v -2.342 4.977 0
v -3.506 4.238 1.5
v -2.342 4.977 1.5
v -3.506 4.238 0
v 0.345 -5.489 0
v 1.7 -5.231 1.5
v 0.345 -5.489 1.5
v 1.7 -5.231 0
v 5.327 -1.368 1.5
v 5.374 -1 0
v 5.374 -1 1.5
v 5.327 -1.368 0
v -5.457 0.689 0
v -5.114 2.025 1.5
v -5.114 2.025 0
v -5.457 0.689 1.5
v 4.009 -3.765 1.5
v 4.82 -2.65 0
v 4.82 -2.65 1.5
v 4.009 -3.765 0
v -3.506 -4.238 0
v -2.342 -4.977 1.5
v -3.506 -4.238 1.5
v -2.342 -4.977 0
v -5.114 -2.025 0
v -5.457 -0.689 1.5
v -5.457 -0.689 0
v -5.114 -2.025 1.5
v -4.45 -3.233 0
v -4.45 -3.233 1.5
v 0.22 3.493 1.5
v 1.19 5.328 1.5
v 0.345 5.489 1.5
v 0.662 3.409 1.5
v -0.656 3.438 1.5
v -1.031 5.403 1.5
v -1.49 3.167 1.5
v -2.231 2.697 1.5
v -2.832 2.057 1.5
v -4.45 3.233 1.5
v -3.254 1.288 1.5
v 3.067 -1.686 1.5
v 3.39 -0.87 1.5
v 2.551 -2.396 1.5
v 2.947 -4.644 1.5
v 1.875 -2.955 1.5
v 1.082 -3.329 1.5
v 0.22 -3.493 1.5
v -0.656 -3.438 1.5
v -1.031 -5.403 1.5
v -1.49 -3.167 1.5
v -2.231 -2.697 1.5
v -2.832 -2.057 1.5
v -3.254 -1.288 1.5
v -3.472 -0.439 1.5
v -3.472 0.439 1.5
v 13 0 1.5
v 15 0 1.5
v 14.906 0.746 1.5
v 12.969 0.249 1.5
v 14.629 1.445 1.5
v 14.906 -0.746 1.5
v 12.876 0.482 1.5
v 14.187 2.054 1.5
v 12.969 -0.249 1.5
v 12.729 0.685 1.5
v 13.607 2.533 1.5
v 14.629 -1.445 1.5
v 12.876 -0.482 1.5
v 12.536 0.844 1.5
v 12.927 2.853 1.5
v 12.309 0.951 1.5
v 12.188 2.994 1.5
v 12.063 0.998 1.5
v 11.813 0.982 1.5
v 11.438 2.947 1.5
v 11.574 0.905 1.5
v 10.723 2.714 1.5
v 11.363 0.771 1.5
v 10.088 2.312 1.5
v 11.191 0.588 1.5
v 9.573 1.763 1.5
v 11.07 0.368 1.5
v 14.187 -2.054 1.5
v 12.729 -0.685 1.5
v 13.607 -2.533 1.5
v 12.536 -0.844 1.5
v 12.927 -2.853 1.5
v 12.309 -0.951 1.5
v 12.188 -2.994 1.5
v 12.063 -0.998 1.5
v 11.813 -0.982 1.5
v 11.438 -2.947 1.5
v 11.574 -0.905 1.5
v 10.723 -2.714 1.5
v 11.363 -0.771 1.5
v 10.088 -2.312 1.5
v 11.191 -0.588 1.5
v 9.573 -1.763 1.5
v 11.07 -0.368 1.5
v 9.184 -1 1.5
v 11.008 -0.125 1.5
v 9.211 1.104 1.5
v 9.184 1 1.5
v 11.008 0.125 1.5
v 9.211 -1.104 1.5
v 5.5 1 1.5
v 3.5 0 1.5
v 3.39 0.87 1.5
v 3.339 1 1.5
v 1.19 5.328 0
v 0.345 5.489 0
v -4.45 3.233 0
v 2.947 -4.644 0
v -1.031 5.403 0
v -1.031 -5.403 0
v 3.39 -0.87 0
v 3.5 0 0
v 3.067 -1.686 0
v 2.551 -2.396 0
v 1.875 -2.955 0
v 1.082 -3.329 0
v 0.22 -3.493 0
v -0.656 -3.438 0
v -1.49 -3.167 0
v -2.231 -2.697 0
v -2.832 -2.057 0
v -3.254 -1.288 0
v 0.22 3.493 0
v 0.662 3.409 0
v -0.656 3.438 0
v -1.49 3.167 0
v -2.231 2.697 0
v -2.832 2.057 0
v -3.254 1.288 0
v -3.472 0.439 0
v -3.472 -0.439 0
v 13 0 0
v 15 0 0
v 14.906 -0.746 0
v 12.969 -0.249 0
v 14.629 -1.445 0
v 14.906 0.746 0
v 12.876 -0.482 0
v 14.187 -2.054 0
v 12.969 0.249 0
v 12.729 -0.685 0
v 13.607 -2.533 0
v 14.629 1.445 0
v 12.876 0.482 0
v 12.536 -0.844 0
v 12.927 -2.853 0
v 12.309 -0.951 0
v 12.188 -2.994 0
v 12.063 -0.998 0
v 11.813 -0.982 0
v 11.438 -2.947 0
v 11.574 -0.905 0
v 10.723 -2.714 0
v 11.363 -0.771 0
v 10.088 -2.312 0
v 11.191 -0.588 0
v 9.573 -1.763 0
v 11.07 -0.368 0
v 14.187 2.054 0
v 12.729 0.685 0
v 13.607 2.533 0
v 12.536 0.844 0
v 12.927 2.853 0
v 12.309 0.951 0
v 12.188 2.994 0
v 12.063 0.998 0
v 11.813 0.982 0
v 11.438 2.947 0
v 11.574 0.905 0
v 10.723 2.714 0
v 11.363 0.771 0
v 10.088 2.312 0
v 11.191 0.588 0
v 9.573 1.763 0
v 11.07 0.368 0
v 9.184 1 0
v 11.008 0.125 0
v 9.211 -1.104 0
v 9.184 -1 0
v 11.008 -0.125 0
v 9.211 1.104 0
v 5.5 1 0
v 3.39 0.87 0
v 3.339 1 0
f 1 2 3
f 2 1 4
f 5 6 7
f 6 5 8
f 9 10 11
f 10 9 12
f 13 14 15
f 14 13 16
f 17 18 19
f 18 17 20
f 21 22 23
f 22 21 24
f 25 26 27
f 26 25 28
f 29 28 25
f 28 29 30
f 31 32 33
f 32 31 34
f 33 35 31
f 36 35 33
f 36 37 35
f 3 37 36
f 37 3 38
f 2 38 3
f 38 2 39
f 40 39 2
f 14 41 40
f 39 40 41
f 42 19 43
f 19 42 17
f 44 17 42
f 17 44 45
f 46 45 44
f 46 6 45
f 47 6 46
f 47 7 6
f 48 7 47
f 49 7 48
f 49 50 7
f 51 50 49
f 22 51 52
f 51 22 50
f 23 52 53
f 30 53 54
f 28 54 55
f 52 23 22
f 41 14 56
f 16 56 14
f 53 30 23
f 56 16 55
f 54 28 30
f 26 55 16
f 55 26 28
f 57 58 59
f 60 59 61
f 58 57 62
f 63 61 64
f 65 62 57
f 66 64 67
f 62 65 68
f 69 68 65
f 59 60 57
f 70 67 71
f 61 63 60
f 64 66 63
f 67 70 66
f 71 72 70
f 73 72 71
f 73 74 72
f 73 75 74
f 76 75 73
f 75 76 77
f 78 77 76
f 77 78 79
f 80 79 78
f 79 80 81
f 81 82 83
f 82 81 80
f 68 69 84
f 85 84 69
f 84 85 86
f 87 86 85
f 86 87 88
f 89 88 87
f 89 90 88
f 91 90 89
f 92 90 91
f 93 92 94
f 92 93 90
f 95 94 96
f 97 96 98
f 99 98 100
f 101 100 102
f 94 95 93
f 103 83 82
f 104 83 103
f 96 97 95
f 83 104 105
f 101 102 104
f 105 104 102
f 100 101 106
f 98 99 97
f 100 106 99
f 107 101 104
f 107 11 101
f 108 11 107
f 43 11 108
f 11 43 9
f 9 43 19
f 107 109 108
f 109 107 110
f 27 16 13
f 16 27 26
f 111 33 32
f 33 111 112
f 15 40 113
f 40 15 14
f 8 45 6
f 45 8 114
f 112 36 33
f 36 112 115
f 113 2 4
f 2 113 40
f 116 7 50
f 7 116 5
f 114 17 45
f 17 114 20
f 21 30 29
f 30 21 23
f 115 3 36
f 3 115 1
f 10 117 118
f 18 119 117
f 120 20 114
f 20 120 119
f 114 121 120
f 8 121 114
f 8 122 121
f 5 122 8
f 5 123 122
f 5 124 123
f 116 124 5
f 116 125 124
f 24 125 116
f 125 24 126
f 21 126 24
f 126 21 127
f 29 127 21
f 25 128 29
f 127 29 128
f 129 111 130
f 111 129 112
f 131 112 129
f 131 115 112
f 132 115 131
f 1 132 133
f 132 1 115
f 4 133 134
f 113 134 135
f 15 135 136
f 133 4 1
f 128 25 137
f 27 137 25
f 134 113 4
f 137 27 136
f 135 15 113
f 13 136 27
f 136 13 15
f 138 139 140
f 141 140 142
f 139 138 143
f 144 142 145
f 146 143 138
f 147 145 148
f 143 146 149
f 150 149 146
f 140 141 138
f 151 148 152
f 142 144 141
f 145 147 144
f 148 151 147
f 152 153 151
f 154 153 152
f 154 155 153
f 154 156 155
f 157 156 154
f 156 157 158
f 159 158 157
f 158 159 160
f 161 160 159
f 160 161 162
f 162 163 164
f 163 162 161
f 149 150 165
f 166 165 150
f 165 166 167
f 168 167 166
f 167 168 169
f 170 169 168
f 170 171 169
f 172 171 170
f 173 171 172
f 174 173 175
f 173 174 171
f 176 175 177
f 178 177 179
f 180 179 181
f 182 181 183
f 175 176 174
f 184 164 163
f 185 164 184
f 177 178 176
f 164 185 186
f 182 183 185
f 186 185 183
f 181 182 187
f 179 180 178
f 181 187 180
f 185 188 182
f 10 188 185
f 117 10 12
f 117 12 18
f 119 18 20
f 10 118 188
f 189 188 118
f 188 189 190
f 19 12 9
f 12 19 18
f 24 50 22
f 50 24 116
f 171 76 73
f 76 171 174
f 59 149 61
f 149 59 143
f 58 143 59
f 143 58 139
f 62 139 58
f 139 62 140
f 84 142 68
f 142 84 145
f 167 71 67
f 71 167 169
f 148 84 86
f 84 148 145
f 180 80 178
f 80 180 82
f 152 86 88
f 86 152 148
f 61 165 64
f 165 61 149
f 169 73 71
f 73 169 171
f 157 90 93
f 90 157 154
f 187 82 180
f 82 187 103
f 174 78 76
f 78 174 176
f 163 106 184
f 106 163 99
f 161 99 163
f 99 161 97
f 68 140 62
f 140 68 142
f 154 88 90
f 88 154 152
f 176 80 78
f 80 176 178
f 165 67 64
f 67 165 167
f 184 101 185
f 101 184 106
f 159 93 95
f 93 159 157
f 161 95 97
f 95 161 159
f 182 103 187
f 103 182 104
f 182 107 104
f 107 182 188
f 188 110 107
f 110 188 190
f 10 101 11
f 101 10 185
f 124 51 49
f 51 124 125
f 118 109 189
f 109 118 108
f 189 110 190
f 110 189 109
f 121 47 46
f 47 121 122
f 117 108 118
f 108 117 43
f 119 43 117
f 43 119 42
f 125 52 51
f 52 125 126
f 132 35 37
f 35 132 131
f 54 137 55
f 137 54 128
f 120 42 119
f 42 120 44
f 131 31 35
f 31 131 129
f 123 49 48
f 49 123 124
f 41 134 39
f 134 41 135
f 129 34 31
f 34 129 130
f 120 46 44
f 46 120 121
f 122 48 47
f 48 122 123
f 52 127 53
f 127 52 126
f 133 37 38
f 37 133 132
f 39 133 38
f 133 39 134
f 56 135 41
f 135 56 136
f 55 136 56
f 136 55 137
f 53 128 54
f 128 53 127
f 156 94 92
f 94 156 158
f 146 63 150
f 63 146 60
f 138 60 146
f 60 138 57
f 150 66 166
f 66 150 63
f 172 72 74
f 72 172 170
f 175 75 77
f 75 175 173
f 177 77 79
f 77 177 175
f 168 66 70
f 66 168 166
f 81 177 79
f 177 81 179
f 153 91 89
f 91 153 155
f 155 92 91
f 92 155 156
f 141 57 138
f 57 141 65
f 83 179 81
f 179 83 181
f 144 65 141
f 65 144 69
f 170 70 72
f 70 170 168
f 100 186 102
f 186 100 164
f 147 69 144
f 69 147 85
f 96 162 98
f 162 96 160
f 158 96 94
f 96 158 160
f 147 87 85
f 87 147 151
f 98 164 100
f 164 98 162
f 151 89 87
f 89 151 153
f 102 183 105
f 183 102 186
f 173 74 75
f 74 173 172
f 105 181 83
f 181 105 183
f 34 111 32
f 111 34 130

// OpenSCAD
include <MCAD/triangles.scad>

$fn=25;

wall_thk = 2;

ring_id = 7;
ring_od = ring_id + 2*wall_thk;

string_hole_id = 2;
string_hole_od = string_hole_id + 2*wall_thk;

thk = 1.5;
hole_centres = 12;

l_neck = hole_centres - ring_od/2 - string_hole_od/2;
echo(l_neck);
wall_tol = wall_thk/2;

cut_tol = 0.01;

difference()
{
union()
{
    cylinder(d=ring_od,h=thk);
    translate([hole_centres,0,0])
    cylinder(d=string_hole_od,h=thk);
        translate([ring_od/2-wall_thk/2,-wall_thk/2,0])
        cube([l_neck+wall_thk,wall_thk,thk]);


}

    
    translate([0,0,-cut_tol])
{
    //holes
    cylinder(d=ring_id,h=thk+2*cut_tol);
    translate([hole_centres,0,0])
        cylinder(d=string_hole_id,h=thk+2*cut_tol);
    //cutout
    translate([ring_od/2,wall_thk/2,0])
        rotate([0,0,90])
            triangle(ring_od/2,20,10);
}
}
